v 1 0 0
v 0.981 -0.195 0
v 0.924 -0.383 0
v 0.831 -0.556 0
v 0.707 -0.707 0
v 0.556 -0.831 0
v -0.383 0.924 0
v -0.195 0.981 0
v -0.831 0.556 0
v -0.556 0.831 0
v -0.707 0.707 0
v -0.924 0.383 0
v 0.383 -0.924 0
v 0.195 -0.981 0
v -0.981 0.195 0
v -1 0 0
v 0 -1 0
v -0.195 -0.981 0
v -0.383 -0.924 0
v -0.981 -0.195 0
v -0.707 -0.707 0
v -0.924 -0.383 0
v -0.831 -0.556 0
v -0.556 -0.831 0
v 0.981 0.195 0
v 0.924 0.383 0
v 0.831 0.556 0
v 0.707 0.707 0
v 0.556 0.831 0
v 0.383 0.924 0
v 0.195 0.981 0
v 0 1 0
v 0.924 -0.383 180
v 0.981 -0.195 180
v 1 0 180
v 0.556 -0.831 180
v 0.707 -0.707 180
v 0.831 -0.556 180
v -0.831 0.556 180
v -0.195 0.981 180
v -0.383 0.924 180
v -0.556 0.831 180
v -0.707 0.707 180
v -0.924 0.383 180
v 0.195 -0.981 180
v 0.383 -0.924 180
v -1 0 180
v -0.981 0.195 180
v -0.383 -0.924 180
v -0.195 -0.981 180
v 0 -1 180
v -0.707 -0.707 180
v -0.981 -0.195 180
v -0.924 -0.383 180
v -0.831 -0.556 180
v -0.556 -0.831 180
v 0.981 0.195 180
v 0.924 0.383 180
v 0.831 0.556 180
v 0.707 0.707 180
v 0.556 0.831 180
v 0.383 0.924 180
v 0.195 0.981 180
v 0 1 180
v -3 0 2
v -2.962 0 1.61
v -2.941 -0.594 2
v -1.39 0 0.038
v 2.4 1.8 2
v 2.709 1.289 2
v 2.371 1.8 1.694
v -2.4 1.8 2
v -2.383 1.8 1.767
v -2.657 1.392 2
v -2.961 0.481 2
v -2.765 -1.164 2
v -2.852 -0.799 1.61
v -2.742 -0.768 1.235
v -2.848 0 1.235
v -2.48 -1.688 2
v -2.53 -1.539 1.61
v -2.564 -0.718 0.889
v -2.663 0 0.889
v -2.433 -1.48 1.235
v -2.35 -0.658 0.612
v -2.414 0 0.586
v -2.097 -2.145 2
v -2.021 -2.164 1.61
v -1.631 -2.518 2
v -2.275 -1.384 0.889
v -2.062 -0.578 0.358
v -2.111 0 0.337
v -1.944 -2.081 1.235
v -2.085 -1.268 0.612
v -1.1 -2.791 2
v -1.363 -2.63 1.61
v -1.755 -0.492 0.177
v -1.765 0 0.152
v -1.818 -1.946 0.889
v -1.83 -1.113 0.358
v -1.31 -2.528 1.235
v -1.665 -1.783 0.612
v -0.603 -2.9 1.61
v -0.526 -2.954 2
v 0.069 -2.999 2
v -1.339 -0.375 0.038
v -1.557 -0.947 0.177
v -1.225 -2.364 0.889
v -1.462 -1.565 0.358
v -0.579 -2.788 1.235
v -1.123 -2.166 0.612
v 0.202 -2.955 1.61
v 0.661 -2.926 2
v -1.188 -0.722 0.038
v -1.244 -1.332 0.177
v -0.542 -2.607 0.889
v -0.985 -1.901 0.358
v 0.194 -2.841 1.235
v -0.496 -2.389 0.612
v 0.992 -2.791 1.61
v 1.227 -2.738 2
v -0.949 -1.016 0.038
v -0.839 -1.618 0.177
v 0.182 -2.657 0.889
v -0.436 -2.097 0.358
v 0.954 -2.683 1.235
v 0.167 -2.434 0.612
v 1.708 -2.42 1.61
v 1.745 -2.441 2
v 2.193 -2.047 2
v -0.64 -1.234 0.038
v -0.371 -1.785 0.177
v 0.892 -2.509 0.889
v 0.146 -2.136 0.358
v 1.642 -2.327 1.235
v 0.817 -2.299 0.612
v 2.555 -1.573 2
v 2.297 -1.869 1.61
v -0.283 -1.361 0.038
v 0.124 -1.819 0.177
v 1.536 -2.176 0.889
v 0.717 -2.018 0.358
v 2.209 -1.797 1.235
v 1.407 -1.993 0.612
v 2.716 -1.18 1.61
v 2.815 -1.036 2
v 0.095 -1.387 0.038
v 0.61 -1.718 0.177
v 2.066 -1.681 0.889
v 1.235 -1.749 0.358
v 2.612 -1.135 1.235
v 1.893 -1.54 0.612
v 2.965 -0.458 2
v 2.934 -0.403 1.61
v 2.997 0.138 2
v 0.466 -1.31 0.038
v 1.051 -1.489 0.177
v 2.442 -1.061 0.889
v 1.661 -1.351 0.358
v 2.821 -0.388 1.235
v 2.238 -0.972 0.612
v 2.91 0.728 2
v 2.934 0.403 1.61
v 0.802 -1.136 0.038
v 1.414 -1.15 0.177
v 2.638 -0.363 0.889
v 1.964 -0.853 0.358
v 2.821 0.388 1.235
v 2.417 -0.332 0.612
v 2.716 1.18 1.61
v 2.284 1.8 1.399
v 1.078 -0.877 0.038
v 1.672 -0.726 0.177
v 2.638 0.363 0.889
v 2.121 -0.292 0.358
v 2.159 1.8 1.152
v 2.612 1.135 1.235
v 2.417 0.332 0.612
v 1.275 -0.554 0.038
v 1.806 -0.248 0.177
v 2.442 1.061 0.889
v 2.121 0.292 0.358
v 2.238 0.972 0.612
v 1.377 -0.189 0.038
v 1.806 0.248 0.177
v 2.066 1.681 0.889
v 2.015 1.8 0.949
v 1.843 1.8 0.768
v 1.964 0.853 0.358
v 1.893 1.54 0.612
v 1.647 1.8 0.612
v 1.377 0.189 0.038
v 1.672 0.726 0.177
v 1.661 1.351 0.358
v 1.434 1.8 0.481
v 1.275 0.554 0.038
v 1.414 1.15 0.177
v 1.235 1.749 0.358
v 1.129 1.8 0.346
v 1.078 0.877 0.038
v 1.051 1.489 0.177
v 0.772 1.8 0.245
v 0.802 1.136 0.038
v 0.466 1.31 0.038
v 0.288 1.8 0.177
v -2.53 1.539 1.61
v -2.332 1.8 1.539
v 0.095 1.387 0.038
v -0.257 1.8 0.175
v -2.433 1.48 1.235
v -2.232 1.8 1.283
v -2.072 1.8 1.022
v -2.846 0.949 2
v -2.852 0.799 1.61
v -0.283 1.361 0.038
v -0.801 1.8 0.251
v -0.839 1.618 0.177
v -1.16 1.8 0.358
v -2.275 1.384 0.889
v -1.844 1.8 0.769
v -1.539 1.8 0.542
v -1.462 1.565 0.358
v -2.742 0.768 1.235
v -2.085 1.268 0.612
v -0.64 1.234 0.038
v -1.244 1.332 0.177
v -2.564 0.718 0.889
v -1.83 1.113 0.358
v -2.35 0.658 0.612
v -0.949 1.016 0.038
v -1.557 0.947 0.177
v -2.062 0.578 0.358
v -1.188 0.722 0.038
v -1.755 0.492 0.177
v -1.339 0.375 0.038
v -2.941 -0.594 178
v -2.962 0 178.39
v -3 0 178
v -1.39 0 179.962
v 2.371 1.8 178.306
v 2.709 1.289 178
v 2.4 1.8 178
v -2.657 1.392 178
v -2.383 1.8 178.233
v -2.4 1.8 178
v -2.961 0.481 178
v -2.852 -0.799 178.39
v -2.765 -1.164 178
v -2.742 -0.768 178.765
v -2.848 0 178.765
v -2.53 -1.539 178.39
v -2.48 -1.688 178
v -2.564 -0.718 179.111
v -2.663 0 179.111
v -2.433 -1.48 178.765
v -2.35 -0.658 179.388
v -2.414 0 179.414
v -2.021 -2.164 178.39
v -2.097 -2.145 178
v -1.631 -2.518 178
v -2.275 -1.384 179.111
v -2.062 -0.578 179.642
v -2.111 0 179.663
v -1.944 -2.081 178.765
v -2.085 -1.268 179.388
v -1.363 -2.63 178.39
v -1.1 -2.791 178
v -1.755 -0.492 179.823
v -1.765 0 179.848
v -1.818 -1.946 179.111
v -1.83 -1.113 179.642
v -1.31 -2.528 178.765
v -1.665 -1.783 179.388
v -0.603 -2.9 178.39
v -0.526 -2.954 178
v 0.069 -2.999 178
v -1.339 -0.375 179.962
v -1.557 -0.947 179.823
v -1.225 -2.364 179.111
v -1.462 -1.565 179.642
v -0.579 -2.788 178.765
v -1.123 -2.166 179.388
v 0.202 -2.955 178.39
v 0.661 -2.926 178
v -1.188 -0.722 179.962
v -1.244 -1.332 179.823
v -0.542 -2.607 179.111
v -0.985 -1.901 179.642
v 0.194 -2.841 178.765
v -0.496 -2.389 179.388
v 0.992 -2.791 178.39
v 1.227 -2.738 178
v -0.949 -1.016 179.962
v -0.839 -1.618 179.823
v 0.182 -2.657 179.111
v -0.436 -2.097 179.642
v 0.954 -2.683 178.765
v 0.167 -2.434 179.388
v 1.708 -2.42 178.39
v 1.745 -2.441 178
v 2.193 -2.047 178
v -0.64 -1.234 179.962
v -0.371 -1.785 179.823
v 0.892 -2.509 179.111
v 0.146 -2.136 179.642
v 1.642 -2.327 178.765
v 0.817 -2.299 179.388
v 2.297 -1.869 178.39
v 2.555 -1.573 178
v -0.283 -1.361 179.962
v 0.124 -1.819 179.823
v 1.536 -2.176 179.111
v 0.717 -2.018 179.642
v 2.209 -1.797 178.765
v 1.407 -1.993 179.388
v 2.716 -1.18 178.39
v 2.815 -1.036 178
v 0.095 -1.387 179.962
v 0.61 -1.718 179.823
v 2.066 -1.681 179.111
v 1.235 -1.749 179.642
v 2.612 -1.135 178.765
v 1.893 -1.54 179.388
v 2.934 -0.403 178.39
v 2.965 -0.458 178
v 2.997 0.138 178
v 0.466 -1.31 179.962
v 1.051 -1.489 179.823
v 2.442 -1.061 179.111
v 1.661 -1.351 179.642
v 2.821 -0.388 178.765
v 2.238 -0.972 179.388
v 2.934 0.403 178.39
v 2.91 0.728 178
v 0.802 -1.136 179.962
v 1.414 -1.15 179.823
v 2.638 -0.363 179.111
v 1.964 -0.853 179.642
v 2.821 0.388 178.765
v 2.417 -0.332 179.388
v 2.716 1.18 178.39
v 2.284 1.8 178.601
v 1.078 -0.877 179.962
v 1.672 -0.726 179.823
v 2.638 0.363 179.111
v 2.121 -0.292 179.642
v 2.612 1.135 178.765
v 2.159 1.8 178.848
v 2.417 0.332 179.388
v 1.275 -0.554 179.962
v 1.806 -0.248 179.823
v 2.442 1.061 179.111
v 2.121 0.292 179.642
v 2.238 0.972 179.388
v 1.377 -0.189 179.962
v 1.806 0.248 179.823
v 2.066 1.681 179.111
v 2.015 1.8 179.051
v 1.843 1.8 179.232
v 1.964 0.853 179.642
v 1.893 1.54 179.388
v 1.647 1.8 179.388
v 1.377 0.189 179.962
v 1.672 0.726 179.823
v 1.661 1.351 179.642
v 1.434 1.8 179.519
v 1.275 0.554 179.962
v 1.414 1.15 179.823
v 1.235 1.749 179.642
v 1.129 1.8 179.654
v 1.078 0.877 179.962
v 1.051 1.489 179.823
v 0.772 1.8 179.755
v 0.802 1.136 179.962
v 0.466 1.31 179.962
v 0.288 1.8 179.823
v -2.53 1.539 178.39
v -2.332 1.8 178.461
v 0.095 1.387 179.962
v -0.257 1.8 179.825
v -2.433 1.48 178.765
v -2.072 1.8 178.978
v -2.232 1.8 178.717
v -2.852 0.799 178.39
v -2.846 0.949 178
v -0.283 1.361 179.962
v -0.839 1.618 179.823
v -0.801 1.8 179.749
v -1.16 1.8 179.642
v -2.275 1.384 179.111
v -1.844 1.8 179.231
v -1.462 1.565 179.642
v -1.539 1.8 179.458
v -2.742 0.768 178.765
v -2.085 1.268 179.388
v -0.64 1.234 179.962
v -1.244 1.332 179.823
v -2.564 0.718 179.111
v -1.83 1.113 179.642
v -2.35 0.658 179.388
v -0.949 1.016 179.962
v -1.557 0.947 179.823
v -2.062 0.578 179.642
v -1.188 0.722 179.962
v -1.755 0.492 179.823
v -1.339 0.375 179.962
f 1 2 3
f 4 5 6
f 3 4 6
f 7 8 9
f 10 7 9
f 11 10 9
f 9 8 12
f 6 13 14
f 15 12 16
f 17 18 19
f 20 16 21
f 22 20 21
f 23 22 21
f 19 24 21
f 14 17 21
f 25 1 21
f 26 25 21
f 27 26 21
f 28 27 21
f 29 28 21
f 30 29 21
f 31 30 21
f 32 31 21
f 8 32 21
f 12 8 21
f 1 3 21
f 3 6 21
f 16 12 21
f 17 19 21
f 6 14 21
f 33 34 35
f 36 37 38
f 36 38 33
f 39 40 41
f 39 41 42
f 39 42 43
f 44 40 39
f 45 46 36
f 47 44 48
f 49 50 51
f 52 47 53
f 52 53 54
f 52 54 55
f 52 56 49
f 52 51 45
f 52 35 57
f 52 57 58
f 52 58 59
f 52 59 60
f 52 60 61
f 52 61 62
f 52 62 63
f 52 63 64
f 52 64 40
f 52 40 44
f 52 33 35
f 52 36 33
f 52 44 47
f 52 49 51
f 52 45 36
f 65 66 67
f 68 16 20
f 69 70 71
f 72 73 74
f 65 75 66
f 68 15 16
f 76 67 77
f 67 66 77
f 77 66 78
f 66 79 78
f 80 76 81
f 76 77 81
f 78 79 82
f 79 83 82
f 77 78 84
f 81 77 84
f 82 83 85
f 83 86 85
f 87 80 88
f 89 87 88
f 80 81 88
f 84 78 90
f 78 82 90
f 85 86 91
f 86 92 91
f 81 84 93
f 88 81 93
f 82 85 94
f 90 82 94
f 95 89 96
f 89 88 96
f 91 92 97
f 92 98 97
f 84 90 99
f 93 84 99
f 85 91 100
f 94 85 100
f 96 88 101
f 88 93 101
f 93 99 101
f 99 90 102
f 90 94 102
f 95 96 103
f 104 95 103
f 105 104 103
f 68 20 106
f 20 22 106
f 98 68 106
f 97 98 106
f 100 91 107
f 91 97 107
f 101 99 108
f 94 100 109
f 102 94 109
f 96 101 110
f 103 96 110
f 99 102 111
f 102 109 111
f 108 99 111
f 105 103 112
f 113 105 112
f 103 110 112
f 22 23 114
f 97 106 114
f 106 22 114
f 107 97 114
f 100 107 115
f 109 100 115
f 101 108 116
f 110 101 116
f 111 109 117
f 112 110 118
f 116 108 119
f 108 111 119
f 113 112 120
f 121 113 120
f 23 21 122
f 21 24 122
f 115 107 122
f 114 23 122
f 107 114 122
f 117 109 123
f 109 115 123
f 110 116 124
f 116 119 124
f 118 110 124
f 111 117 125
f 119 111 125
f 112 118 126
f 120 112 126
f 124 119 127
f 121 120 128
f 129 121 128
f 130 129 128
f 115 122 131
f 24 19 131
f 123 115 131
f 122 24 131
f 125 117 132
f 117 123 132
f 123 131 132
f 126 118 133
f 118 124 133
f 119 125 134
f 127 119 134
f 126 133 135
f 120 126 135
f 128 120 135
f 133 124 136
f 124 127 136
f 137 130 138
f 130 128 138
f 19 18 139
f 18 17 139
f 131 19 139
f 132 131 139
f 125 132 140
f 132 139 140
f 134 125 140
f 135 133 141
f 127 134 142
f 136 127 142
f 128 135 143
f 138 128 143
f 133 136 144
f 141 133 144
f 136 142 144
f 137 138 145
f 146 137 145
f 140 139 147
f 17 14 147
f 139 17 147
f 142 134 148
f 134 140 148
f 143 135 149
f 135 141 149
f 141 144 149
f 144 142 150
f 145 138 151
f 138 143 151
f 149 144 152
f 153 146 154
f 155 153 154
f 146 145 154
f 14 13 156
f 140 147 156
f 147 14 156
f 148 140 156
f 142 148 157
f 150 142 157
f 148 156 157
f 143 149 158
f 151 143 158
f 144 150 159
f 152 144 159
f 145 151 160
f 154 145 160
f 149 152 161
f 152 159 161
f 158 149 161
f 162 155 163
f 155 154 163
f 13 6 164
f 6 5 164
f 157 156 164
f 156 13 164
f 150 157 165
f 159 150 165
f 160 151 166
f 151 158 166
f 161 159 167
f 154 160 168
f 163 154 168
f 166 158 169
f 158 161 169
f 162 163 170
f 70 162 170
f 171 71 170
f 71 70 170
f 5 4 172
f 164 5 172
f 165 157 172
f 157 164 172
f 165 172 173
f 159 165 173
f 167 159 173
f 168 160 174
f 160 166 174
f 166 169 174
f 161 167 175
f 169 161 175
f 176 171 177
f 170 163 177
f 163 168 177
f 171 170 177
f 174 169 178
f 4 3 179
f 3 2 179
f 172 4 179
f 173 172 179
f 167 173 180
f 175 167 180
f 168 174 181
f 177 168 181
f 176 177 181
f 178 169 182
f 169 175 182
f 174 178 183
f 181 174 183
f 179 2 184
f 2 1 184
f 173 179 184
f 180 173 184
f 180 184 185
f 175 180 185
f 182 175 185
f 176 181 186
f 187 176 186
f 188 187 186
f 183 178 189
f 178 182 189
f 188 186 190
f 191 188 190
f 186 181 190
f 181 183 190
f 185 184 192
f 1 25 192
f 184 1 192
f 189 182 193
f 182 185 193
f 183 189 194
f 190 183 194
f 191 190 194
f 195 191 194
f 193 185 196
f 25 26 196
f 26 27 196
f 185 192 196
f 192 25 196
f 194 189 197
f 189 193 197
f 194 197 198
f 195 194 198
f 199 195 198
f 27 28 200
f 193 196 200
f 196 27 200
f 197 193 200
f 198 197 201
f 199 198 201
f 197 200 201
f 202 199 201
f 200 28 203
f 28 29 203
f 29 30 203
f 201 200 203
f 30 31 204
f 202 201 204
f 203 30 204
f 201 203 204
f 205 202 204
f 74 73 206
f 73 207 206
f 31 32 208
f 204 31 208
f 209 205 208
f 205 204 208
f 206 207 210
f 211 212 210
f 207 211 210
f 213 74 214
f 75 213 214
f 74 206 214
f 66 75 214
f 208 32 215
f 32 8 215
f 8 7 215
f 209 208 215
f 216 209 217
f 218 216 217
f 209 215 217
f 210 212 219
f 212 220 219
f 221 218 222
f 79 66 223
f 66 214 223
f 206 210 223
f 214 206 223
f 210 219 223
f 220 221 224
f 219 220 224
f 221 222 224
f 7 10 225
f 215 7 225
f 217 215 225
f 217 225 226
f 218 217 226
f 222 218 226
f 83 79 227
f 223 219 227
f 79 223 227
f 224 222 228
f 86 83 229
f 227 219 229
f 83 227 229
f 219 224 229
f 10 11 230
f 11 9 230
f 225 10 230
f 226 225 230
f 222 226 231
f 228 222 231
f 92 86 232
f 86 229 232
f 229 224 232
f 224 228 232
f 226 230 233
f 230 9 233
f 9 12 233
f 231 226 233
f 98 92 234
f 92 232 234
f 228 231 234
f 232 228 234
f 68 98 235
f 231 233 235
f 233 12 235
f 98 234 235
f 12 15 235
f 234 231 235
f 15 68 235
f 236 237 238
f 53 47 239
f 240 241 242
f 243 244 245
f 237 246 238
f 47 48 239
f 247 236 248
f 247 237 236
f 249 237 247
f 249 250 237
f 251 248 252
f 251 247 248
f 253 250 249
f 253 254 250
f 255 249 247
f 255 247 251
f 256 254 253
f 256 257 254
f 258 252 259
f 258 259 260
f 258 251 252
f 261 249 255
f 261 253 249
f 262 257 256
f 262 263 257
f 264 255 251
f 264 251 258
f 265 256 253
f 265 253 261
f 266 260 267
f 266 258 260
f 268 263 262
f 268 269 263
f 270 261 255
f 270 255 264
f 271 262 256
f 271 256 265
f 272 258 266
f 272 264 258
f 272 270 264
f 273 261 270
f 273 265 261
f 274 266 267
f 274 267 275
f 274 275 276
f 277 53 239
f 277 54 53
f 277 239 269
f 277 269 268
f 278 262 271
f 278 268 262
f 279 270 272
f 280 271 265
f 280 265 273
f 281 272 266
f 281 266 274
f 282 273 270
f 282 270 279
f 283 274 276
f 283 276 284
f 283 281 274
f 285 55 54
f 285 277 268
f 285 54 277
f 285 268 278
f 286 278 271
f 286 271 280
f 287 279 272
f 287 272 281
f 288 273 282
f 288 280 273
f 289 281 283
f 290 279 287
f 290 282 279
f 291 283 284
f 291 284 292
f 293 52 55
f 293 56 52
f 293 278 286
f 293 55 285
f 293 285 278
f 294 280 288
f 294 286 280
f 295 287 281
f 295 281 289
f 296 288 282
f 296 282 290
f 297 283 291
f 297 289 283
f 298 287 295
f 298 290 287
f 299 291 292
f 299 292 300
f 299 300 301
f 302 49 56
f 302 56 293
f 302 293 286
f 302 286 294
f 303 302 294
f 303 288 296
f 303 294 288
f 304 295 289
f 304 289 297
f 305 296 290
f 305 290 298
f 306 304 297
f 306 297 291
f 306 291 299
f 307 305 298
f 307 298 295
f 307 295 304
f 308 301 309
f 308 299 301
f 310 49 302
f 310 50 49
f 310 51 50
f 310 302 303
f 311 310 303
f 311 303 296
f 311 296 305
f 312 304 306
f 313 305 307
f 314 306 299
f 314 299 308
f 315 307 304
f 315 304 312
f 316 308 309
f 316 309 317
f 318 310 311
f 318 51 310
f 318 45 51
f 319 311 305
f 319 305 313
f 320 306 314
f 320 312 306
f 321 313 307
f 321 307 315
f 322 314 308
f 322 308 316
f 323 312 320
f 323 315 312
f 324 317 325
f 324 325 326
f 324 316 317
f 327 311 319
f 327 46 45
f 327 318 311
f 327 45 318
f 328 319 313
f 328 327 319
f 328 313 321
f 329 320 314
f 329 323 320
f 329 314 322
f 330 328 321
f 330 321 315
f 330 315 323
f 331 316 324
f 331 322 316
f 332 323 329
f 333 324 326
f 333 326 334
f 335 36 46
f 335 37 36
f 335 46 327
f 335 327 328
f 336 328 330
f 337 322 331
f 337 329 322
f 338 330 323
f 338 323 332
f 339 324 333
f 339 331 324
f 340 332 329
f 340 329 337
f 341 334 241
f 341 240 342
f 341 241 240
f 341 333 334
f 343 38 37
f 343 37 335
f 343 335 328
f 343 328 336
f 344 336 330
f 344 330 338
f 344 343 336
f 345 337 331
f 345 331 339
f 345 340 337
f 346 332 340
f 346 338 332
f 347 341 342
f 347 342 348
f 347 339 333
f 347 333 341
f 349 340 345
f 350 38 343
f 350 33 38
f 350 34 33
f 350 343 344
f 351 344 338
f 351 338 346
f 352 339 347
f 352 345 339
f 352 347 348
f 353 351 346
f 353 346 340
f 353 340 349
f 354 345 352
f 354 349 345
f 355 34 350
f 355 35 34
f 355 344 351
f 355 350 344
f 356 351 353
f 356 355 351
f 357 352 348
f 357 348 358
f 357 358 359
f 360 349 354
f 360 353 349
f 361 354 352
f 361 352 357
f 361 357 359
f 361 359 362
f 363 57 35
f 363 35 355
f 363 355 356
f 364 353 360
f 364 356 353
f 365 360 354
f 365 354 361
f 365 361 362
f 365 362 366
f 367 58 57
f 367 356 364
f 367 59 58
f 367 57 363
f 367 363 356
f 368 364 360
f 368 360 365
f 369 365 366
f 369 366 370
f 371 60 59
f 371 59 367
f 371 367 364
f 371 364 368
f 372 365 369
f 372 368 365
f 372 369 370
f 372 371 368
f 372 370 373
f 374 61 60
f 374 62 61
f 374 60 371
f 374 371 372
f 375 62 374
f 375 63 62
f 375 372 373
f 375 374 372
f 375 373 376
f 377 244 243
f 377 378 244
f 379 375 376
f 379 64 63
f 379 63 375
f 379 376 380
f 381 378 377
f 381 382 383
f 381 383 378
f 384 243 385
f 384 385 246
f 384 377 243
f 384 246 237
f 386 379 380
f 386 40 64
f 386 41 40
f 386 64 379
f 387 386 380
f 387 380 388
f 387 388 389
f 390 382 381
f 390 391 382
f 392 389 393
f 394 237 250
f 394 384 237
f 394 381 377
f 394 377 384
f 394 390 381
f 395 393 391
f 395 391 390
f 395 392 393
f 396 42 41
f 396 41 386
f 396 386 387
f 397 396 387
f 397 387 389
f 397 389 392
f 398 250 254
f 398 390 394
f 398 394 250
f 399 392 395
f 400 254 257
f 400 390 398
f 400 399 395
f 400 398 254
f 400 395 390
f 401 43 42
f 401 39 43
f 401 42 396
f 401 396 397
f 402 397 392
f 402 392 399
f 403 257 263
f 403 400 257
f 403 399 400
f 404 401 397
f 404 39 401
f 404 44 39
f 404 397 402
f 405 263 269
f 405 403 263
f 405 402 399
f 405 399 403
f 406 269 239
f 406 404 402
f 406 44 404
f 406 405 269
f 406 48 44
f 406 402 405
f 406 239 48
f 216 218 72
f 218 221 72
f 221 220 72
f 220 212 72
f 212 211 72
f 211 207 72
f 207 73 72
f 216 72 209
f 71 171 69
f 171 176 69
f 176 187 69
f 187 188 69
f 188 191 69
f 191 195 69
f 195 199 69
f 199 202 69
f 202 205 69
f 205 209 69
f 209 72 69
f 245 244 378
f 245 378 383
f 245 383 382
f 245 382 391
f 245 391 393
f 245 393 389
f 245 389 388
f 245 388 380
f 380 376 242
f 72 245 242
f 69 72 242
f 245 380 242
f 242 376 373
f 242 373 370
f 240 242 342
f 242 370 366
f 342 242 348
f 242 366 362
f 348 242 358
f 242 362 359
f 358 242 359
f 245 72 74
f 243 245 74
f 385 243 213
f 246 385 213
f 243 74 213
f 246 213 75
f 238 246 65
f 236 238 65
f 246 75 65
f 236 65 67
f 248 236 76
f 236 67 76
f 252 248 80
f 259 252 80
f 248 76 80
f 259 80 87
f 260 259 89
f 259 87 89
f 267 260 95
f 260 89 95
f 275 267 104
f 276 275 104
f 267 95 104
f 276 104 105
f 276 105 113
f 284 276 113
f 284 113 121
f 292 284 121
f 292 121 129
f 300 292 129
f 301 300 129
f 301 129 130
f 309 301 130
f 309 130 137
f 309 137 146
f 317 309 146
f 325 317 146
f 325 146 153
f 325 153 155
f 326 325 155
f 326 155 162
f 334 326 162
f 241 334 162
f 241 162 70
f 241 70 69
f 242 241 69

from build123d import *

# Parameters (mm, degrees)
ESQUISSE1_R             = 3
BOSS_EXTRU_1_DEPTH      = 180
CONG_1_R                = 2
ESQUISSE2_W             = 6
ESQUISSE2_H             = 1.2
ENL_V_MAT_EXTRU_1_DEPTH = 181.049993057


with BuildPart() as part:
    # Esquisse1 → Boss.-Extru.1 (new body)
    with BuildSketch(Plane.XY):
        with Locations(Location((0, 0, 0), (0, 0, 180))):
            Circle(ESQUISSE1_R)
    extrude(amount=BOSS_EXTRU_1_DEPTH)

    # Congé1
    cong_1_edges = [part.edges().sort_by_distance(p)[0] for p in [
        (3, 0, 0),
        (3, 0, 180),
    ]]
    fillet(cong_1_edges, radius=CONG_1_R)

    # Esquisse2 → Enlèv. mat.-Extru.1 (cut, through all)
    with BuildSketch(Plane.XY.offset(180)):
        with Locations((0, 2.4)):
            Rectangle(ESQUISSE2_W, ESQUISSE2_H)
    extrude(amount=-ENL_V_MAT_EXTRU_1_DEPTH, mode=Mode.SUBTRACT)


solid = part.part
